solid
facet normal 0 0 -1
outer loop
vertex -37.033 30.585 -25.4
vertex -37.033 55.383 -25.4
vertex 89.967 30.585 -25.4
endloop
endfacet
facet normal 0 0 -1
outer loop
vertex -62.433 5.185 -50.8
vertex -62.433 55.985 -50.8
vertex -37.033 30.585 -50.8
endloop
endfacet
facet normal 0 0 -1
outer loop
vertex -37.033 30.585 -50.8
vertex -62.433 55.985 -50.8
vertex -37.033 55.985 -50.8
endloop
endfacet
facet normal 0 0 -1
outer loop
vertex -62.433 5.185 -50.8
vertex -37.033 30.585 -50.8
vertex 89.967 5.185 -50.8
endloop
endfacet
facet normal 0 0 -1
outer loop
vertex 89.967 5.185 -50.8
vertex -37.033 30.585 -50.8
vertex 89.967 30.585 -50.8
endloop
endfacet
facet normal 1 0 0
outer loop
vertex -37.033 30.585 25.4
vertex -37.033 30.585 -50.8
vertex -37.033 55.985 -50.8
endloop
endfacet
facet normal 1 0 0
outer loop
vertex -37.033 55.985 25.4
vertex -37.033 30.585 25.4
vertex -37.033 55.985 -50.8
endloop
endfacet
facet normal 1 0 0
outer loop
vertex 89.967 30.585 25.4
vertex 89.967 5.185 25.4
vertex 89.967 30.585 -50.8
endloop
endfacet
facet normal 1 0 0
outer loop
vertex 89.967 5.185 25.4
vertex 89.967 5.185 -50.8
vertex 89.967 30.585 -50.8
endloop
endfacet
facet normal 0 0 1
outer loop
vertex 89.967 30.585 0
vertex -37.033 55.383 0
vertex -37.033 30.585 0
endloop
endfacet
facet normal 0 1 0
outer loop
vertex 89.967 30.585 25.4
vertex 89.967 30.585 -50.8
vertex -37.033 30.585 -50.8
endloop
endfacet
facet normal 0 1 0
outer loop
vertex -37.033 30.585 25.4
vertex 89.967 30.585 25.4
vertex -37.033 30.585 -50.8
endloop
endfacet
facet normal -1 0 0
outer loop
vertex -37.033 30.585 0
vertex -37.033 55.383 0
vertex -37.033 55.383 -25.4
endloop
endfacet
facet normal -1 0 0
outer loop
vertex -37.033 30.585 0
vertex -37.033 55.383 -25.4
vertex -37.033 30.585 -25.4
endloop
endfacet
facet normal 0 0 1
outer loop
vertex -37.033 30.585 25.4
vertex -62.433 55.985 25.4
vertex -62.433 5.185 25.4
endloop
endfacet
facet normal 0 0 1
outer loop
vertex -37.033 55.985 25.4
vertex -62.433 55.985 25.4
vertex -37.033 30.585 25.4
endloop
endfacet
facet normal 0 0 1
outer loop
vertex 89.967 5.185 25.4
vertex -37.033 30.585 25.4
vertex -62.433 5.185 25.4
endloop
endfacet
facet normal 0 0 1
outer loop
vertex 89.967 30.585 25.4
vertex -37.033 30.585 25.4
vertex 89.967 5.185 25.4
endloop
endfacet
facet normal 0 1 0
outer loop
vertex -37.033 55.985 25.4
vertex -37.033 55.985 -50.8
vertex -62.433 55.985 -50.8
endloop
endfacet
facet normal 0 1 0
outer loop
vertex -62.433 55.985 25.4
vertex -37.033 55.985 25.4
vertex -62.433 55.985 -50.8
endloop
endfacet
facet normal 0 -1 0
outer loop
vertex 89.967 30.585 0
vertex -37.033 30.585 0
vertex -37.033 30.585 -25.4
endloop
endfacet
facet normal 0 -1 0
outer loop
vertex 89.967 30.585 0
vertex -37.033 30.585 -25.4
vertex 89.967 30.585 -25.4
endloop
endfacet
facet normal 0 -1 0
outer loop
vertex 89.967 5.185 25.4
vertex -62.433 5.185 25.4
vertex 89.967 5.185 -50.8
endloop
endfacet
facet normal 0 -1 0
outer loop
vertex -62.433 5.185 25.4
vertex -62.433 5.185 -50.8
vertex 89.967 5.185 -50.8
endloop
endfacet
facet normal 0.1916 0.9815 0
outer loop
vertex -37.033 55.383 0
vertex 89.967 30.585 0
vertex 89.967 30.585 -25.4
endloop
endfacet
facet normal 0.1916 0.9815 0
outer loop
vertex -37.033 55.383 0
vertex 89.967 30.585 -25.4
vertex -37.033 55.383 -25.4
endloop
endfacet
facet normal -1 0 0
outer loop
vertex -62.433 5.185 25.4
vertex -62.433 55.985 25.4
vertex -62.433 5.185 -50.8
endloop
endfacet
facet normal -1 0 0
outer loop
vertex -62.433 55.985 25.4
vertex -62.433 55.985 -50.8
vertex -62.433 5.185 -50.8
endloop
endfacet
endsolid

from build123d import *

# Parameters (mm, degrees)
F1_DEPTH = 50.8
F2_DEPTH = 25.4
F3_DEPTH = 25.4


with BuildPart() as f1:
    # F0 (on Top) → F1 (new body)
    with BuildSketch(Plane.XY):
        Polygon((-37.0331916732, 55.9852184538), (-62.4331916732, 55.9852184538), (-62.4331916732, 5.1852184538), (89.9668083268, 5.1852184538), (89.9668083268, 30.5852184538), (-37.0331916732, 30.5852184538), (-37.0331916732, 55.3826626255), align=None)
    extrude(amount=-F1_DEPTH)

    # F0 (on Top) → F3 (join)
    with BuildSketch(Plane.XY):
        Polygon((-37.0331916732, 55.9852184538), (-62.4331916732, 55.9852184538), (-62.4331916732, 5.1852184538), (89.9668083268, 5.1852184538), (89.9668083268, 30.5852184538), (-37.0331916732, 30.5852184538), (-37.0331916732, 55.3826626255), align=None)
    extrude(amount=F3_DEPTH)


with BuildPart() as f2:
    # F0 (on Top) → F2 (new body)
    with BuildSketch(Plane.XY):
        Polygon((89.9668083268, 30.5852184538), (-37.0331916732, 55.3826626255), (-37.0331916732, 30.5852184538), align=None)
    extrude(amount=-F2_DEPTH)


solid = Compound([f1.part, f2.part])
